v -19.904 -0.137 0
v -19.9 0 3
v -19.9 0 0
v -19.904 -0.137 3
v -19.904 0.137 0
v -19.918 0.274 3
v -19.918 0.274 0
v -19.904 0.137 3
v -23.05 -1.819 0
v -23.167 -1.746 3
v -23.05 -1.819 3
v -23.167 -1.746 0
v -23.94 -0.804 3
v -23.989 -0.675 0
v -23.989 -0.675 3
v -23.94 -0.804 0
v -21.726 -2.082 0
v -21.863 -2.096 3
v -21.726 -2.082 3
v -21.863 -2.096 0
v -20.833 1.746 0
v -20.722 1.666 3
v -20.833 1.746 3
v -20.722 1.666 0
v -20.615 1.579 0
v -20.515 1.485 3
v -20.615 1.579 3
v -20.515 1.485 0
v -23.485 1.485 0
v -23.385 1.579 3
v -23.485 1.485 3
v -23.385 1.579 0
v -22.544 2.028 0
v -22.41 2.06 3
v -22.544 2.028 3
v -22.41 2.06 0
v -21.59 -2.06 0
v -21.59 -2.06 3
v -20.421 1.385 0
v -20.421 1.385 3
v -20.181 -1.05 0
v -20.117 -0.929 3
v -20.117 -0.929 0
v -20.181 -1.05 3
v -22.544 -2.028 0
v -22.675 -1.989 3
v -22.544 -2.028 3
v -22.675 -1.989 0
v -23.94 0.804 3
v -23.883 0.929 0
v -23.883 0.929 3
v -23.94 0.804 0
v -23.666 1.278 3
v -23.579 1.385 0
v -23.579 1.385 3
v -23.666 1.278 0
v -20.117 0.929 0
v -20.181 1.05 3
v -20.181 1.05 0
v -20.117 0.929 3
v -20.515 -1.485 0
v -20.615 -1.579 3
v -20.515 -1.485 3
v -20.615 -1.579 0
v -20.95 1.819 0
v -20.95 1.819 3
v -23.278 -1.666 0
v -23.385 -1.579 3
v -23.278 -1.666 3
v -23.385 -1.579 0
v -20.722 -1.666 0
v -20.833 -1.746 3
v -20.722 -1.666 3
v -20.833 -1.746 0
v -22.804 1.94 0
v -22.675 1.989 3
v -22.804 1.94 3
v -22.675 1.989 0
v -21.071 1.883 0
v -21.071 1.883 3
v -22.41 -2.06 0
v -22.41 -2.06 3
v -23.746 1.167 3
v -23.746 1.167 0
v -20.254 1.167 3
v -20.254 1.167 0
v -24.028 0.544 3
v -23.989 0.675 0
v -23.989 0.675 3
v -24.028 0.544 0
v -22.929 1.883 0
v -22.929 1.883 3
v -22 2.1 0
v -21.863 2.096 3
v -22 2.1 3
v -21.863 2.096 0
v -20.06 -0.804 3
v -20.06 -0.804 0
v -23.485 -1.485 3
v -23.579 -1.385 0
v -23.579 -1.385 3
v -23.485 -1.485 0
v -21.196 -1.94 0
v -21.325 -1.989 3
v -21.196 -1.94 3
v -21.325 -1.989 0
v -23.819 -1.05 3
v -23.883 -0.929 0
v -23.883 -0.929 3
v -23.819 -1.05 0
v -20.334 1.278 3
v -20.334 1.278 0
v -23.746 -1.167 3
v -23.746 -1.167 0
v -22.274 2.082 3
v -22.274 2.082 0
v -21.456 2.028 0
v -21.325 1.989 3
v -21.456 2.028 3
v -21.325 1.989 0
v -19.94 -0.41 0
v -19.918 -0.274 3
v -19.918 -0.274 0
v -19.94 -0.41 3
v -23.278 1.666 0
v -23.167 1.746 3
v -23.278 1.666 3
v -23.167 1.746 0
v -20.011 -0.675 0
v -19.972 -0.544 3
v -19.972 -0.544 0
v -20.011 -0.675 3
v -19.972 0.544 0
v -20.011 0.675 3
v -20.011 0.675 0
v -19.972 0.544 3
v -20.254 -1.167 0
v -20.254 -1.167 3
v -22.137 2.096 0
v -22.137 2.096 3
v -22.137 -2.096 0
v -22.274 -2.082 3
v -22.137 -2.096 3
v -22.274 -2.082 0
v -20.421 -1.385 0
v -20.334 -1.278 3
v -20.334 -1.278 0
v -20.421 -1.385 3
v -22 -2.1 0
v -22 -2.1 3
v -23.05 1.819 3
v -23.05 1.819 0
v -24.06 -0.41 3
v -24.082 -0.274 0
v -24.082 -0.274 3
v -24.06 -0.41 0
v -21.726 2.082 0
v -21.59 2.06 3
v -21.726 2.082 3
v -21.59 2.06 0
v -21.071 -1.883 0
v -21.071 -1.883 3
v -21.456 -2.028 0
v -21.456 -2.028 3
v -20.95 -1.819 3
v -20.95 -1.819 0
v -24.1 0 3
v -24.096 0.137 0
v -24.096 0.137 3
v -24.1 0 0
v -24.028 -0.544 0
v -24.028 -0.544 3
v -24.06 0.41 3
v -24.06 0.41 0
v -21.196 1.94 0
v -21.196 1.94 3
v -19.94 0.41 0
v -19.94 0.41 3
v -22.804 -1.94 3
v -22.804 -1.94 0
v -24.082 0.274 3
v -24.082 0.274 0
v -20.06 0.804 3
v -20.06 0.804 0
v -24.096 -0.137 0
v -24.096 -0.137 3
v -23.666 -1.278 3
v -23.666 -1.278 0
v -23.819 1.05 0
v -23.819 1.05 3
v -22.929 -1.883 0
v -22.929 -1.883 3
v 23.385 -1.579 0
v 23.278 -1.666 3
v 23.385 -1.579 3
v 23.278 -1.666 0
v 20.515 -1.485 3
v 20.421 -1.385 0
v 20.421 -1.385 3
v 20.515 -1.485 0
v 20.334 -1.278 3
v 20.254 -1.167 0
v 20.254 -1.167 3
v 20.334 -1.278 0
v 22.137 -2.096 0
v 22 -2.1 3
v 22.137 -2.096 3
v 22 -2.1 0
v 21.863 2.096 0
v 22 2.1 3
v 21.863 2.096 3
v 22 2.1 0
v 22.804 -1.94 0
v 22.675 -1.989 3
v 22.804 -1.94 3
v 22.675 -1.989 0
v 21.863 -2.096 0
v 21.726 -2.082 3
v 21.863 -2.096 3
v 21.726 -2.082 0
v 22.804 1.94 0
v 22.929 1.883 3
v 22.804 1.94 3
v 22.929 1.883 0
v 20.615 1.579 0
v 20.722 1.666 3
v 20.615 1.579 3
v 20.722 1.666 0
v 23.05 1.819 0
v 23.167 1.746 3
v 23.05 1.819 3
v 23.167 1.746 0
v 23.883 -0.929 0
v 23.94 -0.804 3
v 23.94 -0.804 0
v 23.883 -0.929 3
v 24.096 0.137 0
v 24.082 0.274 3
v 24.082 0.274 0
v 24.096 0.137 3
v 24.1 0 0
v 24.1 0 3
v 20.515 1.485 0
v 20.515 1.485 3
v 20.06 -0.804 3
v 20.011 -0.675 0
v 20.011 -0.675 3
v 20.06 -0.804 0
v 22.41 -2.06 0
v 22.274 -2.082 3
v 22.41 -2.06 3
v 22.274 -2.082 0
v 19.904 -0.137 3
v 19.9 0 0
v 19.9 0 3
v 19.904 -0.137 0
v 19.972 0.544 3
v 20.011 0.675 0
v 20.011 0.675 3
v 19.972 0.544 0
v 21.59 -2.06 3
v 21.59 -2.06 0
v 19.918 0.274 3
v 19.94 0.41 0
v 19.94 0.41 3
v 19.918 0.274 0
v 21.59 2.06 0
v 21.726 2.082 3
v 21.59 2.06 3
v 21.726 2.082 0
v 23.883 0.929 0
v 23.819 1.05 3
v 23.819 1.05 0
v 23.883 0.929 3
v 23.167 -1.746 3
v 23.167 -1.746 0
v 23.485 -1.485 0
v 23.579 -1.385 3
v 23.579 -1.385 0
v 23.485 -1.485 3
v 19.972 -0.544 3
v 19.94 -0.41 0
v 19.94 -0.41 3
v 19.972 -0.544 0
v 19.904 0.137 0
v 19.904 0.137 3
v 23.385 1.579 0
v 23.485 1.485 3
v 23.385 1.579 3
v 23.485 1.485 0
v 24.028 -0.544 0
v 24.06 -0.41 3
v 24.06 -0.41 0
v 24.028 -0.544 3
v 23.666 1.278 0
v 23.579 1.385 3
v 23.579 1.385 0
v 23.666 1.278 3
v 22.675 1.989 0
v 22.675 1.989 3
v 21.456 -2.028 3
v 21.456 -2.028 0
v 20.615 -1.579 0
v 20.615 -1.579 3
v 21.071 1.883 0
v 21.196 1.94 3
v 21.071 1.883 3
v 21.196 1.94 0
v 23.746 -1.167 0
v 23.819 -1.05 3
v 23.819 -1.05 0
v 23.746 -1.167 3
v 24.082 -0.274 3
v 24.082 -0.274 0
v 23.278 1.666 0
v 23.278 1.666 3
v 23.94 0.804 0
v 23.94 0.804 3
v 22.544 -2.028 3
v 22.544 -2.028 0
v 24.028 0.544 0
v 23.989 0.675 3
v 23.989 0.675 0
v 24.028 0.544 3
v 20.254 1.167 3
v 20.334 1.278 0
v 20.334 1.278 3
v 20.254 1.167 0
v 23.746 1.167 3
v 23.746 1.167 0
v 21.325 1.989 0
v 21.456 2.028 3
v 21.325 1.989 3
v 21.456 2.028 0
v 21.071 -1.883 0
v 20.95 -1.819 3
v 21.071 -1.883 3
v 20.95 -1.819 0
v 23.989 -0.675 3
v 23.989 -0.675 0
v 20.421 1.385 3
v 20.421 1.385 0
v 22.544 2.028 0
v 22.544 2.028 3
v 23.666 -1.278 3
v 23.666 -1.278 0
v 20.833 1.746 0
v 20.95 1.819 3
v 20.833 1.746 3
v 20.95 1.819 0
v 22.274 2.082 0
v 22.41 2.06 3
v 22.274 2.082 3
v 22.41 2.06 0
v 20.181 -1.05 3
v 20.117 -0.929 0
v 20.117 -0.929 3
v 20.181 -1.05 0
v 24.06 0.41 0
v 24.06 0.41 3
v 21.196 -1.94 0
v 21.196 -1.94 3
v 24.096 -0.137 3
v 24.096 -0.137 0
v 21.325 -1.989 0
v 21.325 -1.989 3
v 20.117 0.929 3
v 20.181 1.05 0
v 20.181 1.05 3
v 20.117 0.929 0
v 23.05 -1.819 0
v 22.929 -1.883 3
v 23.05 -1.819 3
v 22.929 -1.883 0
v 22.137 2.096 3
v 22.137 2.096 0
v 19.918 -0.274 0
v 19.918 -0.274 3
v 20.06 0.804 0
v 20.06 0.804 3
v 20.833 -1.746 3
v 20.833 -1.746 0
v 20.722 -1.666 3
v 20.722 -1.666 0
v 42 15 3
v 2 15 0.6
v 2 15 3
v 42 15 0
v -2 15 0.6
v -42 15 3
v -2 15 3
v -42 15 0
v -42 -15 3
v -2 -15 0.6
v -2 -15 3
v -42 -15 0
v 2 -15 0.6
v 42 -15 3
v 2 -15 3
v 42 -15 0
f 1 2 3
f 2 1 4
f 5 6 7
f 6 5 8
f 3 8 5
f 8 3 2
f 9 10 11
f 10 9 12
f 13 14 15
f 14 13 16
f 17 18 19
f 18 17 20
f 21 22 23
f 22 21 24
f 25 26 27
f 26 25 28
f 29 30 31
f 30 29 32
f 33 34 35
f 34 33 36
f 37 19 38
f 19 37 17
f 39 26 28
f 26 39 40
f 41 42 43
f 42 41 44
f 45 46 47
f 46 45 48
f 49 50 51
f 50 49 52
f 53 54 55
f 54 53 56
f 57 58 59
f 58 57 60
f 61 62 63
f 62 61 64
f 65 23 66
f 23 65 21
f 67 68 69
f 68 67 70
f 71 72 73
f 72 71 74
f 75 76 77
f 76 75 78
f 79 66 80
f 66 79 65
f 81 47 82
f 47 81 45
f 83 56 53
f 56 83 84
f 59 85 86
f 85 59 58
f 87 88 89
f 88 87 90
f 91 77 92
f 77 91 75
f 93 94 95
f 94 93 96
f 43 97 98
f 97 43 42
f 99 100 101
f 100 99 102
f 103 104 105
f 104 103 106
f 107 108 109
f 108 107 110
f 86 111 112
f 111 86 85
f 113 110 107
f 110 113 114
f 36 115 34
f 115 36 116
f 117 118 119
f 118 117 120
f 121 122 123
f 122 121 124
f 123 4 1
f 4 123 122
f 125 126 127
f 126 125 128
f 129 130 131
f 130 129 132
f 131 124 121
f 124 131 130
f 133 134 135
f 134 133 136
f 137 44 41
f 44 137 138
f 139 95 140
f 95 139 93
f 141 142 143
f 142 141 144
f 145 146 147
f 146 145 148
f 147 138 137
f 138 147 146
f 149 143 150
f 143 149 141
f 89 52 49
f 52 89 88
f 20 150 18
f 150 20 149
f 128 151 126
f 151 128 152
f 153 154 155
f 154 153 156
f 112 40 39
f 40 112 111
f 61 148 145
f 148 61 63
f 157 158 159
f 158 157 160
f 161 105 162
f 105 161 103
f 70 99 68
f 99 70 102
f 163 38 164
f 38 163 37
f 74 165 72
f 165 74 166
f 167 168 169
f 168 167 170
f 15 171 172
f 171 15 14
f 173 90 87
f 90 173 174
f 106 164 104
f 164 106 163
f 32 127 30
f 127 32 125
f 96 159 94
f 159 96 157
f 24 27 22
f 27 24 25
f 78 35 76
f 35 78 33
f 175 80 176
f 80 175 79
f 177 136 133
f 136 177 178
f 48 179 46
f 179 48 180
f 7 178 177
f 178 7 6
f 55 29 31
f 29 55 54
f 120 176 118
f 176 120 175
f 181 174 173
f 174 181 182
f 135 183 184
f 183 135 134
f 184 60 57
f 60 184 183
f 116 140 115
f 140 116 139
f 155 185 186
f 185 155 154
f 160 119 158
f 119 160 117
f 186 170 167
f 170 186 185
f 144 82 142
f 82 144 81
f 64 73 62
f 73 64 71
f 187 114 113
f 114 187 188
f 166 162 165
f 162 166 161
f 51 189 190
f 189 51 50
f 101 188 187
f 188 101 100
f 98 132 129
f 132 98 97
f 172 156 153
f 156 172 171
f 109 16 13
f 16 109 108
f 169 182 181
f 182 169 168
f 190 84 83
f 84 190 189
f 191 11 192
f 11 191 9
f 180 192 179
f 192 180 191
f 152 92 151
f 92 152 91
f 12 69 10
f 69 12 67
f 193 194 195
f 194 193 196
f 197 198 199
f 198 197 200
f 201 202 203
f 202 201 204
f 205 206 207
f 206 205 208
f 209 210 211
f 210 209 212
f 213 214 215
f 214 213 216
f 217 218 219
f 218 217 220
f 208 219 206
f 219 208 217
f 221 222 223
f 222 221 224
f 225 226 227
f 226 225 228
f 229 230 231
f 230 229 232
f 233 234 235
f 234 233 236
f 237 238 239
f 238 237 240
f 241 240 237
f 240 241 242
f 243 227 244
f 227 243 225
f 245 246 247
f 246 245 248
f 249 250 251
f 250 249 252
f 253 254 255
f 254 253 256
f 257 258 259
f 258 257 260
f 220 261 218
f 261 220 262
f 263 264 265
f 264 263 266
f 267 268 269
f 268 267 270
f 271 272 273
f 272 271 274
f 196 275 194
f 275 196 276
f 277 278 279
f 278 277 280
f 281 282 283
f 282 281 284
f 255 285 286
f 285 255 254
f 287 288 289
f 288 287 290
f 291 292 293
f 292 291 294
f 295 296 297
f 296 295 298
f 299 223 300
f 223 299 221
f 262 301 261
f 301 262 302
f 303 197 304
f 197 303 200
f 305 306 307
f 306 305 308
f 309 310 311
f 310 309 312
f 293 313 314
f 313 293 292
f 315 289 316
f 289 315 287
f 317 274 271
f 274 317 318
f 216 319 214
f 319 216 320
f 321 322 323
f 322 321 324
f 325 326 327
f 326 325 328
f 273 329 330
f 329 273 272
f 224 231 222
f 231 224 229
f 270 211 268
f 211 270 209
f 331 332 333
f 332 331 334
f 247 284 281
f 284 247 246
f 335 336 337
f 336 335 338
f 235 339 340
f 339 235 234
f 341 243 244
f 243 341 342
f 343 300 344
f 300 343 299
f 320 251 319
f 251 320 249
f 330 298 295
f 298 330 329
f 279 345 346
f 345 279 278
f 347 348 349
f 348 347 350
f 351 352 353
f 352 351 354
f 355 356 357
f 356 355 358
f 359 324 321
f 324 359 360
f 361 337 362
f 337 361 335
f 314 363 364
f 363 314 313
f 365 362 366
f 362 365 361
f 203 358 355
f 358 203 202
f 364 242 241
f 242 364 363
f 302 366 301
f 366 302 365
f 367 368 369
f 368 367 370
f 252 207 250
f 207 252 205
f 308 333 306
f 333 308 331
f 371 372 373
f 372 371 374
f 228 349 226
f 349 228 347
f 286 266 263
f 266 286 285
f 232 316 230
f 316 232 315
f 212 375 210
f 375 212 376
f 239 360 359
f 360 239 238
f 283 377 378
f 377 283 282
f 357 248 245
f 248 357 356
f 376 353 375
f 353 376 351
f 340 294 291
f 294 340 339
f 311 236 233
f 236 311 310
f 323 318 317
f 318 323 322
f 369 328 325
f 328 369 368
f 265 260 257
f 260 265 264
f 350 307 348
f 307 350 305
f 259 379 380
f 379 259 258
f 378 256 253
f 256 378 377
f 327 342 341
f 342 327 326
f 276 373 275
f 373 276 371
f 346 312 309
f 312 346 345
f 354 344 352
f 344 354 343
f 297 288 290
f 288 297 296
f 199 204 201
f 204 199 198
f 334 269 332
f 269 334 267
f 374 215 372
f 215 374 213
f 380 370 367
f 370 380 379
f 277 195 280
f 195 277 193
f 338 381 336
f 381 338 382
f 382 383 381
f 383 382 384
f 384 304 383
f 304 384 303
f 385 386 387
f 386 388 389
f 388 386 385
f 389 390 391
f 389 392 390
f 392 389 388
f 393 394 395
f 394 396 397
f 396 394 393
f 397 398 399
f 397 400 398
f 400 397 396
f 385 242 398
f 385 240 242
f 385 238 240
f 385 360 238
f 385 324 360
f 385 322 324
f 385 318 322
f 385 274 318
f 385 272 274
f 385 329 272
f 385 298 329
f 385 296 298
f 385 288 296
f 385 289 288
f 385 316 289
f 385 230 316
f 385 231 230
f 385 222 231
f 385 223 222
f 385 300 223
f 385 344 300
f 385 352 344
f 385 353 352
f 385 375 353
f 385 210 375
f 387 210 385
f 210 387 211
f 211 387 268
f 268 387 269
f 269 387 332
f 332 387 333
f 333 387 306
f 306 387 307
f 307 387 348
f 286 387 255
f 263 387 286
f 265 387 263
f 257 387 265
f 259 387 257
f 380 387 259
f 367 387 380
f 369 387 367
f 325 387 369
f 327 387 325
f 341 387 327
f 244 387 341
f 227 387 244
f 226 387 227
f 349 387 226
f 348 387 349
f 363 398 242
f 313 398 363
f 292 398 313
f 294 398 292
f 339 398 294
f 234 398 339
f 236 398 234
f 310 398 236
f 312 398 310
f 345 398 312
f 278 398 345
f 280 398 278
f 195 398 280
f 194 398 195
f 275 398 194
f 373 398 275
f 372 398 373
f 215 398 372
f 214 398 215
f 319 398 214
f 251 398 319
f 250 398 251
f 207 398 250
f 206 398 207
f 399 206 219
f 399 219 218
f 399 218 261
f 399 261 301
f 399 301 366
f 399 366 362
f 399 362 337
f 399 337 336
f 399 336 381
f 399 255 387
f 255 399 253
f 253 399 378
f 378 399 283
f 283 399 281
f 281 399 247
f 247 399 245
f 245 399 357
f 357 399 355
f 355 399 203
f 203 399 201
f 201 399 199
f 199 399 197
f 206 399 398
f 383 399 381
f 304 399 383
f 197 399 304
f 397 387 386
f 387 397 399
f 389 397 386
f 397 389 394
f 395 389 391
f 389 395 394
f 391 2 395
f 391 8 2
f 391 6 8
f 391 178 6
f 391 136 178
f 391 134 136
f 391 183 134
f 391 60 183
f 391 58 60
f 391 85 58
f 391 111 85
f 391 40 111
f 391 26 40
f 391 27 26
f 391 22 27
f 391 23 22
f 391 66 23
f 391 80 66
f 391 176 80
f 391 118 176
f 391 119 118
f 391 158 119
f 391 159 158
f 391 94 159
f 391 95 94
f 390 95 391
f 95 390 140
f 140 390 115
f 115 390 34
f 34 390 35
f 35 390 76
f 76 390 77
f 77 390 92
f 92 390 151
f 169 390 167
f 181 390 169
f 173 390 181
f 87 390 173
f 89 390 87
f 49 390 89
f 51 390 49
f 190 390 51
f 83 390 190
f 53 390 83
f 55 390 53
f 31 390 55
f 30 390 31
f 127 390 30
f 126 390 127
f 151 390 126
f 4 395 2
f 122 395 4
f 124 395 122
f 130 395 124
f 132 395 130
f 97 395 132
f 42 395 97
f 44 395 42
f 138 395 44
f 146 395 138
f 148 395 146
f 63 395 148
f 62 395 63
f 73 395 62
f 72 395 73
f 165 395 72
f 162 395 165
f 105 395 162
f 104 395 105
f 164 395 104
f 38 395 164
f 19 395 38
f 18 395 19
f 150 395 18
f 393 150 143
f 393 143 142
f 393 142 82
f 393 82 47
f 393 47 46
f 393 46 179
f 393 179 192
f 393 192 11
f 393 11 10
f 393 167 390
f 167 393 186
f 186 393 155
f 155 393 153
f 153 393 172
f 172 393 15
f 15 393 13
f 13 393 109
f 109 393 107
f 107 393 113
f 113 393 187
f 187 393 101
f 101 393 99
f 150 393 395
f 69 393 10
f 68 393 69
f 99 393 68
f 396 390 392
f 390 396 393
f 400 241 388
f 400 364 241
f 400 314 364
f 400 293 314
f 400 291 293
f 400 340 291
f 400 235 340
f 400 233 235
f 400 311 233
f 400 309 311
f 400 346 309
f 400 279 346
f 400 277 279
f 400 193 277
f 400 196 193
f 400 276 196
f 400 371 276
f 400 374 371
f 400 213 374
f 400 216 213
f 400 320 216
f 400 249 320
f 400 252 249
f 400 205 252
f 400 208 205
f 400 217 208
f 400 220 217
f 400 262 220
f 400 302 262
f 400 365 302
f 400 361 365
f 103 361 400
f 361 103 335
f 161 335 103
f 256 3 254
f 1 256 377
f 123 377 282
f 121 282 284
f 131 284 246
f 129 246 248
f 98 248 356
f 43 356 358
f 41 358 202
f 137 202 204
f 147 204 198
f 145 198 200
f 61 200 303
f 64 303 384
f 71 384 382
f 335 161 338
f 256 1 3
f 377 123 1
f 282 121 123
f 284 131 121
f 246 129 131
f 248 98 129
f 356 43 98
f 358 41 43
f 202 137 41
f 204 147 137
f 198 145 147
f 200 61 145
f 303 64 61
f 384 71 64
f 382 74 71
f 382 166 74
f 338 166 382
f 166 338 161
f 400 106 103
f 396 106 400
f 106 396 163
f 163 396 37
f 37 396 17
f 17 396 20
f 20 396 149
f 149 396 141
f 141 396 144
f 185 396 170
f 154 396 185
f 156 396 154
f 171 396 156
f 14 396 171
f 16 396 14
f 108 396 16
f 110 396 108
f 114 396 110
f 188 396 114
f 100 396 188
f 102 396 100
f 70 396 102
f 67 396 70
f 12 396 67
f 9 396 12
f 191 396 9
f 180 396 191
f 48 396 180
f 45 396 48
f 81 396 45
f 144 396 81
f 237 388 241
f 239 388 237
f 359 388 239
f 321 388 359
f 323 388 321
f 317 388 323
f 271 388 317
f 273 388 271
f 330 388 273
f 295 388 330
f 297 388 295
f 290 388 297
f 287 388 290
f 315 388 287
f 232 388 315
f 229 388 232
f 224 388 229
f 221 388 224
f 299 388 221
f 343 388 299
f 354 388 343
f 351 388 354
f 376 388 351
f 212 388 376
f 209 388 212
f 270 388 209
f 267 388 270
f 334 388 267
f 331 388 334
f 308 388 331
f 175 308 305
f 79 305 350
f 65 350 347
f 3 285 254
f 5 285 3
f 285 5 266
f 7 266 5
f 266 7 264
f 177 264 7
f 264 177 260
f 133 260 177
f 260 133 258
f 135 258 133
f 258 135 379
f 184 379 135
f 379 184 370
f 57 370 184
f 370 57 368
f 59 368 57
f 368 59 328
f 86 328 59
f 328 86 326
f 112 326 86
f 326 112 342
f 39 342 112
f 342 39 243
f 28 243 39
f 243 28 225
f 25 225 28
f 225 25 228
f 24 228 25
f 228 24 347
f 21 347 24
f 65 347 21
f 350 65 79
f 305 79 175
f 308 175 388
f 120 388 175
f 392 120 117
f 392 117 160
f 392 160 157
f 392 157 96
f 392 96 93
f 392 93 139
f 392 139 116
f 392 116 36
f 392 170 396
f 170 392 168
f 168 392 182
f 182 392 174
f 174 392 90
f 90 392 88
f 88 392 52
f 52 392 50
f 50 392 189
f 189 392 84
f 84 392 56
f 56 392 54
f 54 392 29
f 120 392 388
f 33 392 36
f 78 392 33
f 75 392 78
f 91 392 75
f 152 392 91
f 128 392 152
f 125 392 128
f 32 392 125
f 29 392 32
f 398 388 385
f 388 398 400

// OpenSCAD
// t4-002 living hinge panel pair
panel_length = 40;
hinge_thickness = 0.6;
hinge_width = 4;
panel_width = 30;
panel_thickness = 3;
hole_d = 4.2;
$fn = 96;

g = hinge_width / 2;
L = g + panel_length;
difference() {
    rotate([90, 0, 0]) linear_extrude(height = panel_width, center = true)
        polygon([[-L, 0], [L, 0], [L, panel_thickness], [g, panel_thickness],
                 [g, hinge_thickness], [-g, hinge_thickness],
                 [-g, panel_thickness], [-L, panel_thickness]]);
    for (s = [-1, 1]) translate([s * (g + panel_length / 2), 0, -1])
        cylinder(d = hole_d, h = panel_thickness + 2);
}
